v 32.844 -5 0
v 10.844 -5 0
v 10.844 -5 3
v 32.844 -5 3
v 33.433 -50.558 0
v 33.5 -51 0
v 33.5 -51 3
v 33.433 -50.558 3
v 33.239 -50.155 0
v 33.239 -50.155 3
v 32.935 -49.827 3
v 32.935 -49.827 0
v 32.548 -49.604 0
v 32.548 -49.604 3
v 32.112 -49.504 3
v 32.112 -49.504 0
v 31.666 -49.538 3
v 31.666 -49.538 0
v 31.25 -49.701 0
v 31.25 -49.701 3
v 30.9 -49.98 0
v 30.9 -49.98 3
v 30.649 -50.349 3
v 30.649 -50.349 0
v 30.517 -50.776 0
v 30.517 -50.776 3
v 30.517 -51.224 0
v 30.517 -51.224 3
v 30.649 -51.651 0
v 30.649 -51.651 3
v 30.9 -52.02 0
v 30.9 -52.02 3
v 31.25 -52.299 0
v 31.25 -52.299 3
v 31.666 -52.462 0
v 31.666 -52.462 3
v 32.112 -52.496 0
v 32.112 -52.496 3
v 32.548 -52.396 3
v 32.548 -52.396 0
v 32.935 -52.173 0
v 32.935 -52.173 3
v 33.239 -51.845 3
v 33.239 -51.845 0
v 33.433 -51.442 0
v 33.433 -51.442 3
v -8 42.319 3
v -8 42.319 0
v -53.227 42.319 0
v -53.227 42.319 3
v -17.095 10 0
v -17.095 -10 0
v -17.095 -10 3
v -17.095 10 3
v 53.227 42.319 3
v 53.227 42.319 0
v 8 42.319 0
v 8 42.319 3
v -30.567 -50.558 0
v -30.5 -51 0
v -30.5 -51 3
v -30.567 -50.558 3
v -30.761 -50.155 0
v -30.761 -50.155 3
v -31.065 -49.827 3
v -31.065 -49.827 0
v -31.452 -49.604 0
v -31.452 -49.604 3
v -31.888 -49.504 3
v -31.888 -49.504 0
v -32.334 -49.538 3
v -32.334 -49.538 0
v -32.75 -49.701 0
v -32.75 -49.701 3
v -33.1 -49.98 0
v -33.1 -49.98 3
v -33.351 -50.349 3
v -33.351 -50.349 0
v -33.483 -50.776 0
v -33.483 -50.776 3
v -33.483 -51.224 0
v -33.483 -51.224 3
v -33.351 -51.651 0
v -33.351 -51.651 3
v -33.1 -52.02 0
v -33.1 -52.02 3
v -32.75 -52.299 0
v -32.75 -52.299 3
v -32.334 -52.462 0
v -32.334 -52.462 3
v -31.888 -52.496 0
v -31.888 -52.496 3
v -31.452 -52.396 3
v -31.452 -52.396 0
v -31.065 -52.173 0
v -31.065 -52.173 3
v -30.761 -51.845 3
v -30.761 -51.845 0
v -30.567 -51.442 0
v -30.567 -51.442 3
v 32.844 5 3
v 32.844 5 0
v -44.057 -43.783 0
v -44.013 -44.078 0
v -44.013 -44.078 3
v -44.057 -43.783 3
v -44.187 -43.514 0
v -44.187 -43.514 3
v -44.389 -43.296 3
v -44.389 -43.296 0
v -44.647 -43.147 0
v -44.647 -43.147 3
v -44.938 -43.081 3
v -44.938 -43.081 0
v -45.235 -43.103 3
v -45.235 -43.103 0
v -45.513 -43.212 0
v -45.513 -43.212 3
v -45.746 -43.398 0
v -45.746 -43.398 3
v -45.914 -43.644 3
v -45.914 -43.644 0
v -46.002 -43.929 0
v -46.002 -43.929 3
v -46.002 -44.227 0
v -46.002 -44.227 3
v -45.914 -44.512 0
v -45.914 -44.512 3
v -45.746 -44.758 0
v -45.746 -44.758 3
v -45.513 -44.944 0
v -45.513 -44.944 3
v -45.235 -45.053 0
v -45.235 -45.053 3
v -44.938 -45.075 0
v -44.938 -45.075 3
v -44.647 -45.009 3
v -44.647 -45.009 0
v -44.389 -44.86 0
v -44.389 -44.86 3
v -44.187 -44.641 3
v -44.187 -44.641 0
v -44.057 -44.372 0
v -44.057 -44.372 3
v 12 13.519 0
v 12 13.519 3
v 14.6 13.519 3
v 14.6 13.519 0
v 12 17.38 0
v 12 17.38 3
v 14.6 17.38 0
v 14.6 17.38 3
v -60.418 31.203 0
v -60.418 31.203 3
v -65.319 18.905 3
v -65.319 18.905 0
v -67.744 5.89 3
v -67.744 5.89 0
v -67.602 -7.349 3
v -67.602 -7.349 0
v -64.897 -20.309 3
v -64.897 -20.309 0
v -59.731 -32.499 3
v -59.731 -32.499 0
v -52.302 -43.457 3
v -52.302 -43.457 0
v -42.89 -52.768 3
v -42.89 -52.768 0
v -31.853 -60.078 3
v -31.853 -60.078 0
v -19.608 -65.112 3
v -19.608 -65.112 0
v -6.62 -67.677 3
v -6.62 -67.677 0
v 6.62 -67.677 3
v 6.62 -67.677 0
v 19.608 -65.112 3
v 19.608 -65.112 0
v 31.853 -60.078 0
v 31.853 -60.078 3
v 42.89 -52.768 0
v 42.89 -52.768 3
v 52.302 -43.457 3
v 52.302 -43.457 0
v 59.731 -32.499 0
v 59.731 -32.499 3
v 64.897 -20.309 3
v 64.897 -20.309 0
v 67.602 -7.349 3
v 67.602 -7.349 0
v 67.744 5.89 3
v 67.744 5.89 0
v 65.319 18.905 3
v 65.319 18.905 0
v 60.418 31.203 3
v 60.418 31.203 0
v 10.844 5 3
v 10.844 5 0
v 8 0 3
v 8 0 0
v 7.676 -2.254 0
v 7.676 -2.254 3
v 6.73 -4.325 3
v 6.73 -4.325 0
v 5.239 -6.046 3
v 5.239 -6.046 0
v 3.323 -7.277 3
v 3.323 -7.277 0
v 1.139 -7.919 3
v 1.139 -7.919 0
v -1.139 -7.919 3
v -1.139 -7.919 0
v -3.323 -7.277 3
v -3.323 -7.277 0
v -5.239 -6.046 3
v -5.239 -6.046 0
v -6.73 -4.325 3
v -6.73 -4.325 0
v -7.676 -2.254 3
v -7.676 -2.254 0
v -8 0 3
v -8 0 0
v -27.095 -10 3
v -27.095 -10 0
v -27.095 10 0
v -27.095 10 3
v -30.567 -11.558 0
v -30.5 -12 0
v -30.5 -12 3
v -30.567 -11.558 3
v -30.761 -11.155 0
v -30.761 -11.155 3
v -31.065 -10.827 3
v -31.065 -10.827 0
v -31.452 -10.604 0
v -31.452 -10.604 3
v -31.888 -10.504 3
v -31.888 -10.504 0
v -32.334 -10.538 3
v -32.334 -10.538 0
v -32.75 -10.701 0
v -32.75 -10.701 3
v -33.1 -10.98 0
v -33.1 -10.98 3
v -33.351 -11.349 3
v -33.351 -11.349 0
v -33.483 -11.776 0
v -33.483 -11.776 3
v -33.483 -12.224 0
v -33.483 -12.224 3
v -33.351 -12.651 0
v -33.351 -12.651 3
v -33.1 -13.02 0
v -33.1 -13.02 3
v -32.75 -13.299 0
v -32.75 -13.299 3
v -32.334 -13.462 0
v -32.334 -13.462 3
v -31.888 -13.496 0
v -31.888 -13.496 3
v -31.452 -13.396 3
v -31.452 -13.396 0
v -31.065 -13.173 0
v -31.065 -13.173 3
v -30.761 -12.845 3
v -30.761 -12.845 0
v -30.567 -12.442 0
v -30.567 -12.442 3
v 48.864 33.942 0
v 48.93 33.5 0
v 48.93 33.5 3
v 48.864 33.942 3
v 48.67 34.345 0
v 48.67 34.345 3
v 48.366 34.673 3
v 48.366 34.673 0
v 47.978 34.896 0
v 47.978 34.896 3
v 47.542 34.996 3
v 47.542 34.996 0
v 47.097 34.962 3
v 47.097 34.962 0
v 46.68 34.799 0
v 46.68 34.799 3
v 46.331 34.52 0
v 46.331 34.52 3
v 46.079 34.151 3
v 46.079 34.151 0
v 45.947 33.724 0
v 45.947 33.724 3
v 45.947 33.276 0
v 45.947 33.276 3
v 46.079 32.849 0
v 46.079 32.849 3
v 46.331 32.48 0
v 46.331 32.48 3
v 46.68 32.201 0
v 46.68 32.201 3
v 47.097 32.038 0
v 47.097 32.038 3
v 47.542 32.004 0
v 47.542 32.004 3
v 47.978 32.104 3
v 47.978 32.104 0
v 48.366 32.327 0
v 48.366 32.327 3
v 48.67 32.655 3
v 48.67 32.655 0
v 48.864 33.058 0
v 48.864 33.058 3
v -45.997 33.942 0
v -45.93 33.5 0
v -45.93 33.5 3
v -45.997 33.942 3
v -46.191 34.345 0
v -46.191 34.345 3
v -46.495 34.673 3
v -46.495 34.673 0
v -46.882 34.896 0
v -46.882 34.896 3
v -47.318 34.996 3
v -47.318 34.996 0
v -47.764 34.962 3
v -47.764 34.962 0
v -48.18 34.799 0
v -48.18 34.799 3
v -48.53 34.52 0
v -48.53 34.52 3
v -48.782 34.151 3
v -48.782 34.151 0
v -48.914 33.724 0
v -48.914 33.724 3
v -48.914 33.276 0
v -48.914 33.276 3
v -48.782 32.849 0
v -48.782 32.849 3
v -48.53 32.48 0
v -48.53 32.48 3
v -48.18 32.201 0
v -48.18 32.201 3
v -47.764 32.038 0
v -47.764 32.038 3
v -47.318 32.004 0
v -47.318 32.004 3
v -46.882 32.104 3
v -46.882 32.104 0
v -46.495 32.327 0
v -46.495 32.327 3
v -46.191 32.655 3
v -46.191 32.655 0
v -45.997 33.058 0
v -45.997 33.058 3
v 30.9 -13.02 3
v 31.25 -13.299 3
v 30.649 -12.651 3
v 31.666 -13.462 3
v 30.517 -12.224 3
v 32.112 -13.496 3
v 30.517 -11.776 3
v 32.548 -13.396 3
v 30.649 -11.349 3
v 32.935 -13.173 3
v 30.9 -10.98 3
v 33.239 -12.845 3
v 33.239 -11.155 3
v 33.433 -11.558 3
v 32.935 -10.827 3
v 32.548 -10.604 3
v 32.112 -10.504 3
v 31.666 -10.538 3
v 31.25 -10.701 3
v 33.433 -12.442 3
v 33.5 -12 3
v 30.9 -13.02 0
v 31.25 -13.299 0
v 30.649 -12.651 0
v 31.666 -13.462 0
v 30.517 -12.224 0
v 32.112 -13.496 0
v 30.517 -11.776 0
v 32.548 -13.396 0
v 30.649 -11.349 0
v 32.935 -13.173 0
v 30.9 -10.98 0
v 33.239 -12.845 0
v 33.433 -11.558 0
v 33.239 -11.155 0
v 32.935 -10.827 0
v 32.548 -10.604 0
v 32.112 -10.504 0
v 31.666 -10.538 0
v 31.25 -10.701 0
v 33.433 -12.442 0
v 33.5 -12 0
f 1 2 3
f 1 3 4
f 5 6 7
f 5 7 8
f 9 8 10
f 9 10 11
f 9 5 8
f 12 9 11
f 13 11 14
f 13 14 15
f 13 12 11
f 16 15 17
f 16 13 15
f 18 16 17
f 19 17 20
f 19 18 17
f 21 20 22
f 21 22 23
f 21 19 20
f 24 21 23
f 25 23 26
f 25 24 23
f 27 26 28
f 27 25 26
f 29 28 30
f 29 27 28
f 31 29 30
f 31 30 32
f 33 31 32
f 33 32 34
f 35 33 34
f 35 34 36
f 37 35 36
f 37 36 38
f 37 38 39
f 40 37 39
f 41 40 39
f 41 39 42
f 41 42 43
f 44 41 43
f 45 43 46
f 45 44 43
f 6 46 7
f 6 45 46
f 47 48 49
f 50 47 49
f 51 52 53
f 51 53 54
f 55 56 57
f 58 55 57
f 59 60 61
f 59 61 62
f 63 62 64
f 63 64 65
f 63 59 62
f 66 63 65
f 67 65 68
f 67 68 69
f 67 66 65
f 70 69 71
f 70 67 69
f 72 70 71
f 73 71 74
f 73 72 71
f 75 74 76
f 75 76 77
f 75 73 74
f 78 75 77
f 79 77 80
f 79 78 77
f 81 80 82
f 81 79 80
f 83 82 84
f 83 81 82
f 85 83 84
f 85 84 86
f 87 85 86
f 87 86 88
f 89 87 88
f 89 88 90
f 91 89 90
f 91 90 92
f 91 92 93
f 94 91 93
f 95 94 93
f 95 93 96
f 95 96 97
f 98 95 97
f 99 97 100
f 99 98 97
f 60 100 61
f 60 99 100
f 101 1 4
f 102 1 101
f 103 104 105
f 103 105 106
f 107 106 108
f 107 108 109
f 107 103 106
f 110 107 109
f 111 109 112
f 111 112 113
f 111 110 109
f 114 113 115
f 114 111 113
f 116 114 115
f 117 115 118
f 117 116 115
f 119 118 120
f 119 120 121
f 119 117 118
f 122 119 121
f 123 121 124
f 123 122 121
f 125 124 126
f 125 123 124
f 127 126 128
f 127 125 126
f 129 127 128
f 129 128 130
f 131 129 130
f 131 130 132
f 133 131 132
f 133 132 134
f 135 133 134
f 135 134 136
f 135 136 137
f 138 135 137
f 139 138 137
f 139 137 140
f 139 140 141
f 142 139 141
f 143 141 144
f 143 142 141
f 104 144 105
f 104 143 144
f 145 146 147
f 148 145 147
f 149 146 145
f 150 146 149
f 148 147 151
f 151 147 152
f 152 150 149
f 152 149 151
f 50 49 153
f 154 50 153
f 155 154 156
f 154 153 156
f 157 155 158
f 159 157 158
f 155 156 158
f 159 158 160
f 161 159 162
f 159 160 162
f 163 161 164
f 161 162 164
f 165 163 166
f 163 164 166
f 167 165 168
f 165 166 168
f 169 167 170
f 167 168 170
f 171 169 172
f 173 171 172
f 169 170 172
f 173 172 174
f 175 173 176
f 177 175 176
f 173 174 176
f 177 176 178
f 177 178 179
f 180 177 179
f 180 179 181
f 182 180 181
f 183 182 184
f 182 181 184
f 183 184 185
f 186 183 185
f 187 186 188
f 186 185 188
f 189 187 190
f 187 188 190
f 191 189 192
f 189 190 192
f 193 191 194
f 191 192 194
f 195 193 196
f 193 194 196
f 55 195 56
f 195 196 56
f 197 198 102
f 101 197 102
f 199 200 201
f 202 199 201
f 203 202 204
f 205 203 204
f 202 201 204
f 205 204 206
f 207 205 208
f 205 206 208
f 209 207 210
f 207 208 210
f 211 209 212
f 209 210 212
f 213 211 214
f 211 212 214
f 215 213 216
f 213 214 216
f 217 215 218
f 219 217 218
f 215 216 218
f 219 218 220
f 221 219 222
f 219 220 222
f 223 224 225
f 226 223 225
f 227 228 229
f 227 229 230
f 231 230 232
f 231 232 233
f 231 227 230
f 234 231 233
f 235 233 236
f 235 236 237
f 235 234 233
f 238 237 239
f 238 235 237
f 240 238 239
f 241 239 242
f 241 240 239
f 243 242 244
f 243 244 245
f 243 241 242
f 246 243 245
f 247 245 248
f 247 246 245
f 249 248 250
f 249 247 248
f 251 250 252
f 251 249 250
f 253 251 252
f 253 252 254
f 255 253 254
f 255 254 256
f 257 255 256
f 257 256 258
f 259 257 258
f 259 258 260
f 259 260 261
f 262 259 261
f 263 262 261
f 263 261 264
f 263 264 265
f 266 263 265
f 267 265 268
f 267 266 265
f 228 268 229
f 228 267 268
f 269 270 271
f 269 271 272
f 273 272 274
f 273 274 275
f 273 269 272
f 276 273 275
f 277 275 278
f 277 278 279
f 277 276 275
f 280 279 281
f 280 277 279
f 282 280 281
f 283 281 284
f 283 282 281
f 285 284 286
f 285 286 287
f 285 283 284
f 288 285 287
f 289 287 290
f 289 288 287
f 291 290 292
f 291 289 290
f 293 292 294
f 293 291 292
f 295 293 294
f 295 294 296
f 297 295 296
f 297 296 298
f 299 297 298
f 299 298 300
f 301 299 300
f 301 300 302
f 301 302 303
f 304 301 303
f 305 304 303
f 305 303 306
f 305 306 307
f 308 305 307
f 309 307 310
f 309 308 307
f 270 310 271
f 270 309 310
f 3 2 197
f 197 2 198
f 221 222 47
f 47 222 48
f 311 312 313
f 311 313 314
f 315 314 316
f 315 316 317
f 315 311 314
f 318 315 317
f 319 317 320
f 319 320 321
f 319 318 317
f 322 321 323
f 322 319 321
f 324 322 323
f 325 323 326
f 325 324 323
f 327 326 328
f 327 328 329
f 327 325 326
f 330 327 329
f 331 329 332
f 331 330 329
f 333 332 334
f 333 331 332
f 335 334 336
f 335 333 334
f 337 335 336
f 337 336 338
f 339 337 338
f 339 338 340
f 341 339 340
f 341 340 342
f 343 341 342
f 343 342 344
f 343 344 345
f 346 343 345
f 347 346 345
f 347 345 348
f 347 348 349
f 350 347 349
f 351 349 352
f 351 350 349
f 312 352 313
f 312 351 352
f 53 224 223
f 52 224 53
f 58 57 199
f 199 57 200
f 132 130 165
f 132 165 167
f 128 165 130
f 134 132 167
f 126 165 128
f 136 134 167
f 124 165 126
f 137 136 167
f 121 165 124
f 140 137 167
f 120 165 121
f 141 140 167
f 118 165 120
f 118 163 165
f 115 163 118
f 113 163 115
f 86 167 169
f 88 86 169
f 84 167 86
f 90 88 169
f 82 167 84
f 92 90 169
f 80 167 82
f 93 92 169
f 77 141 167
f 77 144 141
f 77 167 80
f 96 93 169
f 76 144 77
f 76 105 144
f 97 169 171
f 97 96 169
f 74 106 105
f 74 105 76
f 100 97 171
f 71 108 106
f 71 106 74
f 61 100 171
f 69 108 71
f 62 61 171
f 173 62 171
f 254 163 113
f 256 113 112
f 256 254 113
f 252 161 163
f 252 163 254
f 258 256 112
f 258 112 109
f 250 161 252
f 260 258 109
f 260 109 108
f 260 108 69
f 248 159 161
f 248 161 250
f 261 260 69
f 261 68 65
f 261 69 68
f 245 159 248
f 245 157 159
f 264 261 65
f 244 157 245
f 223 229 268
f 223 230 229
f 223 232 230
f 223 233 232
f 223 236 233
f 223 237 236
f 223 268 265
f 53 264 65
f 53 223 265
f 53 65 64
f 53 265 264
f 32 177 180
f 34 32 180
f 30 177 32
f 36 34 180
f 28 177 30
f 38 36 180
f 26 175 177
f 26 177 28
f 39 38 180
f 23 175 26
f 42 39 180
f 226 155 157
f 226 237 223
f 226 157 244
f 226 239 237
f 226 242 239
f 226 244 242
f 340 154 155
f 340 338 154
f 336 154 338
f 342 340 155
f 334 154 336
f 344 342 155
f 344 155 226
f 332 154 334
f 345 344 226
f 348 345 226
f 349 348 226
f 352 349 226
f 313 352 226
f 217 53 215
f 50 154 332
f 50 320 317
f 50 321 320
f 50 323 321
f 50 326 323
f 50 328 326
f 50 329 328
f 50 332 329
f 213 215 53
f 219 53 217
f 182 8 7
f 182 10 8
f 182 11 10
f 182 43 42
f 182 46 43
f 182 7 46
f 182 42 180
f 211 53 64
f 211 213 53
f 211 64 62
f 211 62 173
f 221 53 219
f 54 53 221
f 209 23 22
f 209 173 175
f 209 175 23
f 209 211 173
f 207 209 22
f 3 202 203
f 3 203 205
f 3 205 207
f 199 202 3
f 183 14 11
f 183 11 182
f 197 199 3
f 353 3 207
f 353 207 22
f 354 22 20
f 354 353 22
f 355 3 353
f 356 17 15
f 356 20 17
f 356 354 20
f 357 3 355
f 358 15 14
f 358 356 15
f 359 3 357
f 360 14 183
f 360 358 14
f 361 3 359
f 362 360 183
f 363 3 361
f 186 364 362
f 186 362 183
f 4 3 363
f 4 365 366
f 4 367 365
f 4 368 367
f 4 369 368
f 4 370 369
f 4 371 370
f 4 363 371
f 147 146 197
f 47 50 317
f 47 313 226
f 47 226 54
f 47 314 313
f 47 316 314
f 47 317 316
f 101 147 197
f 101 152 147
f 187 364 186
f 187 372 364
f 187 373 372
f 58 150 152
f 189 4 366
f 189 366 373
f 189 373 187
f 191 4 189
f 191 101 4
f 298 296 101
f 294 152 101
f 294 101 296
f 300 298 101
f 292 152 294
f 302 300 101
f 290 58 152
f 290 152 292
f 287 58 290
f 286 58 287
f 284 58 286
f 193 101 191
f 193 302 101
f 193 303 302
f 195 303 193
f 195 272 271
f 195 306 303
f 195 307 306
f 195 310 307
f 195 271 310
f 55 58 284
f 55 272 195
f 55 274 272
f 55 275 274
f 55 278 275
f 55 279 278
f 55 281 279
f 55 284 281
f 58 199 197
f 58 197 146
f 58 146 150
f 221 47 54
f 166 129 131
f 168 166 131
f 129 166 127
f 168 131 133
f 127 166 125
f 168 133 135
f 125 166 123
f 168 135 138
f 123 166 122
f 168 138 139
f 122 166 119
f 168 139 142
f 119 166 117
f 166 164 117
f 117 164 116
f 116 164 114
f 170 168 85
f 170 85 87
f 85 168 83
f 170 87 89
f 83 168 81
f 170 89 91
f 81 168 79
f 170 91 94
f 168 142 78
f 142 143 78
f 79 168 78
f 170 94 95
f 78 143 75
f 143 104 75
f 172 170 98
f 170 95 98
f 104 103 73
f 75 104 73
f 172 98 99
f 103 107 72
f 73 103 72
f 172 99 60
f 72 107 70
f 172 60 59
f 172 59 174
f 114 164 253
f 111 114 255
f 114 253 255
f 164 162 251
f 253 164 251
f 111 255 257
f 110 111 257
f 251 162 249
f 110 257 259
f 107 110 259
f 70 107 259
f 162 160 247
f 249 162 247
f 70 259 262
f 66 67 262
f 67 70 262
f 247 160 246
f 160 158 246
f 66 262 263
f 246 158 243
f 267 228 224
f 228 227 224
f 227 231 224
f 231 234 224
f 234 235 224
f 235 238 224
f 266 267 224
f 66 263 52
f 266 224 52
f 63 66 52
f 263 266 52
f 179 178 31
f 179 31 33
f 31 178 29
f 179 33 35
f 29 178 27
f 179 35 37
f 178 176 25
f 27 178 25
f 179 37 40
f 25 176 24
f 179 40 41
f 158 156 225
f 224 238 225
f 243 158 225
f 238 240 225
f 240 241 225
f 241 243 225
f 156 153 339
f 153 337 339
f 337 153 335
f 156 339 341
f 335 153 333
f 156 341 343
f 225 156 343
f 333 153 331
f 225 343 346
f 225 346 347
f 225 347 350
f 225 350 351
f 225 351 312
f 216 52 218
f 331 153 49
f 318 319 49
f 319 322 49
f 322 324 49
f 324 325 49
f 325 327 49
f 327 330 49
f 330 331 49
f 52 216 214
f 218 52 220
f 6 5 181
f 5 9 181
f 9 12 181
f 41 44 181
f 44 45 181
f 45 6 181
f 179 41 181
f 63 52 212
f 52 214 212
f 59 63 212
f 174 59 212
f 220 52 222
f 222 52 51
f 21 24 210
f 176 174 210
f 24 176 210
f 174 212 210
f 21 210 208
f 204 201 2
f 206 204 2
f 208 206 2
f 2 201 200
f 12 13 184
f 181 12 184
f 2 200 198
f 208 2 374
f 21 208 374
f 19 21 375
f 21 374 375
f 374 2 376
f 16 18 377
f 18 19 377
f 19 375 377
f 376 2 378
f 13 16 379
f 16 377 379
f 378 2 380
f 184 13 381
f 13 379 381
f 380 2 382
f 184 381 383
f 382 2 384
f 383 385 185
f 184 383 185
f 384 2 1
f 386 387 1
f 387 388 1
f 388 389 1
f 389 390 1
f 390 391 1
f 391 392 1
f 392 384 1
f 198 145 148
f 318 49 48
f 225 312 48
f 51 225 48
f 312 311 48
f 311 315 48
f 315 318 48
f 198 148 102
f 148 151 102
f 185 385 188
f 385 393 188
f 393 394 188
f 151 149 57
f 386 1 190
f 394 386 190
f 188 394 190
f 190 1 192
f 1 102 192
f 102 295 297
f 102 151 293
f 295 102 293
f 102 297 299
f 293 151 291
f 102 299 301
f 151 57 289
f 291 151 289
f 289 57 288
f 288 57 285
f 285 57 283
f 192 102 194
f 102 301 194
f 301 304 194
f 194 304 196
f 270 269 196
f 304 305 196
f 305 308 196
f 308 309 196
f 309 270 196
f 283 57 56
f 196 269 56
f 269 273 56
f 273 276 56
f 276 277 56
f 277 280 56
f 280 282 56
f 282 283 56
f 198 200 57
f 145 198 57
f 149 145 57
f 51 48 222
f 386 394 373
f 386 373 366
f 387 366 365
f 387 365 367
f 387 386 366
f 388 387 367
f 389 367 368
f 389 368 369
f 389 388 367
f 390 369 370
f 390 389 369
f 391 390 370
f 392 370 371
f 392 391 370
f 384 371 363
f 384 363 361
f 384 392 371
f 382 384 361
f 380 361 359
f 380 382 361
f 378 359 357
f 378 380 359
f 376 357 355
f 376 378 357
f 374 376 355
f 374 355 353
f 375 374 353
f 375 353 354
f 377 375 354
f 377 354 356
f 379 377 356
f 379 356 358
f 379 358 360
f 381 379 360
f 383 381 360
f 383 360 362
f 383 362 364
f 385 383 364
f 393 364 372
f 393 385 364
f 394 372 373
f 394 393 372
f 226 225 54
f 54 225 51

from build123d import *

# Parameters (mm, degrees)
SKETCH1_R           = 1.5
SKETCH1_R_2         = 1
SKETCH1_W           = 22
SKETCH1_H           = 10
SKETCH1_W_2         = 10
SKETCH1_H_2         = 20
BOSS_EXTRUDE2_DEPTH = 3
SKETCH2_W           = 2.6
SKETCH2_H           = 3.861185889
CUT_EXTRUDE1_DEPTH  = 3


with BuildPart() as part:
    # Sketch1 → Boss-Extrude2 (new body)
    with BuildSketch(Plane.XY):
        with BuildLine():
            Line((53.226921663, 42.318965137), (8, 42.318965137))
            Line((8, 42.318965137), (8, 0))
            ThreePointArc((8, 0), (0, -8), (-8, 0))
            Line((-8, 0), (-8, 42.318965137))
            Line((-8, 42.318965137), (-53.226921663, 42.318965137))
            ThreePointArc((-53.226921663, 42.318965137), (0, -68), (53.226921663, 42.318965137))
        make_face()
        with Locations((47.430328075, 33.5)):
            Circle(SKETCH1_R, mode=Mode.SUBTRACT)
        with Locations((-47.430328075, 33.5)):
            Circle(SKETCH1_R, mode=Mode.SUBTRACT)
        with Locations((-45.012826675, -44.077720389)):
            Circle(SKETCH1_R_2, mode=Mode.SUBTRACT)
        with Locations((-32, -12)):
            Circle(SKETCH1_R, mode=Mode.SUBTRACT)
        with Locations((-32, -51)):
            Circle(SKETCH1_R, mode=Mode.SUBTRACT)
        with Locations((32, -51)):
            Circle(SKETCH1_R, mode=Mode.SUBTRACT)
        with Locations((32, -12)):
            Circle(SKETCH1_R, mode=Mode.SUBTRACT)
        with Locations((21.843785427, 0)):
            Rectangle(SKETCH1_W, SKETCH1_H, mode=Mode.SUBTRACT)
        with Locations((-22.094715098, 0)):
            Rectangle(SKETCH1_W_2, SKETCH1_H_2, mode=Mode.SUBTRACT)
    extrude(amount=BOSS_EXTRUDE2_DEPTH)

    # Sketch2 → Cut-Extrude1 (cut)
    with BuildSketch(Plane.XY.offset(3)):
        with Locations((13.3, 15.449558082)):
            Rectangle(SKETCH2_W, SKETCH2_H)
    extrude(amount=-CUT_EXTRUDE1_DEPTH, mode=Mode.SUBTRACT)


solid = part.part
